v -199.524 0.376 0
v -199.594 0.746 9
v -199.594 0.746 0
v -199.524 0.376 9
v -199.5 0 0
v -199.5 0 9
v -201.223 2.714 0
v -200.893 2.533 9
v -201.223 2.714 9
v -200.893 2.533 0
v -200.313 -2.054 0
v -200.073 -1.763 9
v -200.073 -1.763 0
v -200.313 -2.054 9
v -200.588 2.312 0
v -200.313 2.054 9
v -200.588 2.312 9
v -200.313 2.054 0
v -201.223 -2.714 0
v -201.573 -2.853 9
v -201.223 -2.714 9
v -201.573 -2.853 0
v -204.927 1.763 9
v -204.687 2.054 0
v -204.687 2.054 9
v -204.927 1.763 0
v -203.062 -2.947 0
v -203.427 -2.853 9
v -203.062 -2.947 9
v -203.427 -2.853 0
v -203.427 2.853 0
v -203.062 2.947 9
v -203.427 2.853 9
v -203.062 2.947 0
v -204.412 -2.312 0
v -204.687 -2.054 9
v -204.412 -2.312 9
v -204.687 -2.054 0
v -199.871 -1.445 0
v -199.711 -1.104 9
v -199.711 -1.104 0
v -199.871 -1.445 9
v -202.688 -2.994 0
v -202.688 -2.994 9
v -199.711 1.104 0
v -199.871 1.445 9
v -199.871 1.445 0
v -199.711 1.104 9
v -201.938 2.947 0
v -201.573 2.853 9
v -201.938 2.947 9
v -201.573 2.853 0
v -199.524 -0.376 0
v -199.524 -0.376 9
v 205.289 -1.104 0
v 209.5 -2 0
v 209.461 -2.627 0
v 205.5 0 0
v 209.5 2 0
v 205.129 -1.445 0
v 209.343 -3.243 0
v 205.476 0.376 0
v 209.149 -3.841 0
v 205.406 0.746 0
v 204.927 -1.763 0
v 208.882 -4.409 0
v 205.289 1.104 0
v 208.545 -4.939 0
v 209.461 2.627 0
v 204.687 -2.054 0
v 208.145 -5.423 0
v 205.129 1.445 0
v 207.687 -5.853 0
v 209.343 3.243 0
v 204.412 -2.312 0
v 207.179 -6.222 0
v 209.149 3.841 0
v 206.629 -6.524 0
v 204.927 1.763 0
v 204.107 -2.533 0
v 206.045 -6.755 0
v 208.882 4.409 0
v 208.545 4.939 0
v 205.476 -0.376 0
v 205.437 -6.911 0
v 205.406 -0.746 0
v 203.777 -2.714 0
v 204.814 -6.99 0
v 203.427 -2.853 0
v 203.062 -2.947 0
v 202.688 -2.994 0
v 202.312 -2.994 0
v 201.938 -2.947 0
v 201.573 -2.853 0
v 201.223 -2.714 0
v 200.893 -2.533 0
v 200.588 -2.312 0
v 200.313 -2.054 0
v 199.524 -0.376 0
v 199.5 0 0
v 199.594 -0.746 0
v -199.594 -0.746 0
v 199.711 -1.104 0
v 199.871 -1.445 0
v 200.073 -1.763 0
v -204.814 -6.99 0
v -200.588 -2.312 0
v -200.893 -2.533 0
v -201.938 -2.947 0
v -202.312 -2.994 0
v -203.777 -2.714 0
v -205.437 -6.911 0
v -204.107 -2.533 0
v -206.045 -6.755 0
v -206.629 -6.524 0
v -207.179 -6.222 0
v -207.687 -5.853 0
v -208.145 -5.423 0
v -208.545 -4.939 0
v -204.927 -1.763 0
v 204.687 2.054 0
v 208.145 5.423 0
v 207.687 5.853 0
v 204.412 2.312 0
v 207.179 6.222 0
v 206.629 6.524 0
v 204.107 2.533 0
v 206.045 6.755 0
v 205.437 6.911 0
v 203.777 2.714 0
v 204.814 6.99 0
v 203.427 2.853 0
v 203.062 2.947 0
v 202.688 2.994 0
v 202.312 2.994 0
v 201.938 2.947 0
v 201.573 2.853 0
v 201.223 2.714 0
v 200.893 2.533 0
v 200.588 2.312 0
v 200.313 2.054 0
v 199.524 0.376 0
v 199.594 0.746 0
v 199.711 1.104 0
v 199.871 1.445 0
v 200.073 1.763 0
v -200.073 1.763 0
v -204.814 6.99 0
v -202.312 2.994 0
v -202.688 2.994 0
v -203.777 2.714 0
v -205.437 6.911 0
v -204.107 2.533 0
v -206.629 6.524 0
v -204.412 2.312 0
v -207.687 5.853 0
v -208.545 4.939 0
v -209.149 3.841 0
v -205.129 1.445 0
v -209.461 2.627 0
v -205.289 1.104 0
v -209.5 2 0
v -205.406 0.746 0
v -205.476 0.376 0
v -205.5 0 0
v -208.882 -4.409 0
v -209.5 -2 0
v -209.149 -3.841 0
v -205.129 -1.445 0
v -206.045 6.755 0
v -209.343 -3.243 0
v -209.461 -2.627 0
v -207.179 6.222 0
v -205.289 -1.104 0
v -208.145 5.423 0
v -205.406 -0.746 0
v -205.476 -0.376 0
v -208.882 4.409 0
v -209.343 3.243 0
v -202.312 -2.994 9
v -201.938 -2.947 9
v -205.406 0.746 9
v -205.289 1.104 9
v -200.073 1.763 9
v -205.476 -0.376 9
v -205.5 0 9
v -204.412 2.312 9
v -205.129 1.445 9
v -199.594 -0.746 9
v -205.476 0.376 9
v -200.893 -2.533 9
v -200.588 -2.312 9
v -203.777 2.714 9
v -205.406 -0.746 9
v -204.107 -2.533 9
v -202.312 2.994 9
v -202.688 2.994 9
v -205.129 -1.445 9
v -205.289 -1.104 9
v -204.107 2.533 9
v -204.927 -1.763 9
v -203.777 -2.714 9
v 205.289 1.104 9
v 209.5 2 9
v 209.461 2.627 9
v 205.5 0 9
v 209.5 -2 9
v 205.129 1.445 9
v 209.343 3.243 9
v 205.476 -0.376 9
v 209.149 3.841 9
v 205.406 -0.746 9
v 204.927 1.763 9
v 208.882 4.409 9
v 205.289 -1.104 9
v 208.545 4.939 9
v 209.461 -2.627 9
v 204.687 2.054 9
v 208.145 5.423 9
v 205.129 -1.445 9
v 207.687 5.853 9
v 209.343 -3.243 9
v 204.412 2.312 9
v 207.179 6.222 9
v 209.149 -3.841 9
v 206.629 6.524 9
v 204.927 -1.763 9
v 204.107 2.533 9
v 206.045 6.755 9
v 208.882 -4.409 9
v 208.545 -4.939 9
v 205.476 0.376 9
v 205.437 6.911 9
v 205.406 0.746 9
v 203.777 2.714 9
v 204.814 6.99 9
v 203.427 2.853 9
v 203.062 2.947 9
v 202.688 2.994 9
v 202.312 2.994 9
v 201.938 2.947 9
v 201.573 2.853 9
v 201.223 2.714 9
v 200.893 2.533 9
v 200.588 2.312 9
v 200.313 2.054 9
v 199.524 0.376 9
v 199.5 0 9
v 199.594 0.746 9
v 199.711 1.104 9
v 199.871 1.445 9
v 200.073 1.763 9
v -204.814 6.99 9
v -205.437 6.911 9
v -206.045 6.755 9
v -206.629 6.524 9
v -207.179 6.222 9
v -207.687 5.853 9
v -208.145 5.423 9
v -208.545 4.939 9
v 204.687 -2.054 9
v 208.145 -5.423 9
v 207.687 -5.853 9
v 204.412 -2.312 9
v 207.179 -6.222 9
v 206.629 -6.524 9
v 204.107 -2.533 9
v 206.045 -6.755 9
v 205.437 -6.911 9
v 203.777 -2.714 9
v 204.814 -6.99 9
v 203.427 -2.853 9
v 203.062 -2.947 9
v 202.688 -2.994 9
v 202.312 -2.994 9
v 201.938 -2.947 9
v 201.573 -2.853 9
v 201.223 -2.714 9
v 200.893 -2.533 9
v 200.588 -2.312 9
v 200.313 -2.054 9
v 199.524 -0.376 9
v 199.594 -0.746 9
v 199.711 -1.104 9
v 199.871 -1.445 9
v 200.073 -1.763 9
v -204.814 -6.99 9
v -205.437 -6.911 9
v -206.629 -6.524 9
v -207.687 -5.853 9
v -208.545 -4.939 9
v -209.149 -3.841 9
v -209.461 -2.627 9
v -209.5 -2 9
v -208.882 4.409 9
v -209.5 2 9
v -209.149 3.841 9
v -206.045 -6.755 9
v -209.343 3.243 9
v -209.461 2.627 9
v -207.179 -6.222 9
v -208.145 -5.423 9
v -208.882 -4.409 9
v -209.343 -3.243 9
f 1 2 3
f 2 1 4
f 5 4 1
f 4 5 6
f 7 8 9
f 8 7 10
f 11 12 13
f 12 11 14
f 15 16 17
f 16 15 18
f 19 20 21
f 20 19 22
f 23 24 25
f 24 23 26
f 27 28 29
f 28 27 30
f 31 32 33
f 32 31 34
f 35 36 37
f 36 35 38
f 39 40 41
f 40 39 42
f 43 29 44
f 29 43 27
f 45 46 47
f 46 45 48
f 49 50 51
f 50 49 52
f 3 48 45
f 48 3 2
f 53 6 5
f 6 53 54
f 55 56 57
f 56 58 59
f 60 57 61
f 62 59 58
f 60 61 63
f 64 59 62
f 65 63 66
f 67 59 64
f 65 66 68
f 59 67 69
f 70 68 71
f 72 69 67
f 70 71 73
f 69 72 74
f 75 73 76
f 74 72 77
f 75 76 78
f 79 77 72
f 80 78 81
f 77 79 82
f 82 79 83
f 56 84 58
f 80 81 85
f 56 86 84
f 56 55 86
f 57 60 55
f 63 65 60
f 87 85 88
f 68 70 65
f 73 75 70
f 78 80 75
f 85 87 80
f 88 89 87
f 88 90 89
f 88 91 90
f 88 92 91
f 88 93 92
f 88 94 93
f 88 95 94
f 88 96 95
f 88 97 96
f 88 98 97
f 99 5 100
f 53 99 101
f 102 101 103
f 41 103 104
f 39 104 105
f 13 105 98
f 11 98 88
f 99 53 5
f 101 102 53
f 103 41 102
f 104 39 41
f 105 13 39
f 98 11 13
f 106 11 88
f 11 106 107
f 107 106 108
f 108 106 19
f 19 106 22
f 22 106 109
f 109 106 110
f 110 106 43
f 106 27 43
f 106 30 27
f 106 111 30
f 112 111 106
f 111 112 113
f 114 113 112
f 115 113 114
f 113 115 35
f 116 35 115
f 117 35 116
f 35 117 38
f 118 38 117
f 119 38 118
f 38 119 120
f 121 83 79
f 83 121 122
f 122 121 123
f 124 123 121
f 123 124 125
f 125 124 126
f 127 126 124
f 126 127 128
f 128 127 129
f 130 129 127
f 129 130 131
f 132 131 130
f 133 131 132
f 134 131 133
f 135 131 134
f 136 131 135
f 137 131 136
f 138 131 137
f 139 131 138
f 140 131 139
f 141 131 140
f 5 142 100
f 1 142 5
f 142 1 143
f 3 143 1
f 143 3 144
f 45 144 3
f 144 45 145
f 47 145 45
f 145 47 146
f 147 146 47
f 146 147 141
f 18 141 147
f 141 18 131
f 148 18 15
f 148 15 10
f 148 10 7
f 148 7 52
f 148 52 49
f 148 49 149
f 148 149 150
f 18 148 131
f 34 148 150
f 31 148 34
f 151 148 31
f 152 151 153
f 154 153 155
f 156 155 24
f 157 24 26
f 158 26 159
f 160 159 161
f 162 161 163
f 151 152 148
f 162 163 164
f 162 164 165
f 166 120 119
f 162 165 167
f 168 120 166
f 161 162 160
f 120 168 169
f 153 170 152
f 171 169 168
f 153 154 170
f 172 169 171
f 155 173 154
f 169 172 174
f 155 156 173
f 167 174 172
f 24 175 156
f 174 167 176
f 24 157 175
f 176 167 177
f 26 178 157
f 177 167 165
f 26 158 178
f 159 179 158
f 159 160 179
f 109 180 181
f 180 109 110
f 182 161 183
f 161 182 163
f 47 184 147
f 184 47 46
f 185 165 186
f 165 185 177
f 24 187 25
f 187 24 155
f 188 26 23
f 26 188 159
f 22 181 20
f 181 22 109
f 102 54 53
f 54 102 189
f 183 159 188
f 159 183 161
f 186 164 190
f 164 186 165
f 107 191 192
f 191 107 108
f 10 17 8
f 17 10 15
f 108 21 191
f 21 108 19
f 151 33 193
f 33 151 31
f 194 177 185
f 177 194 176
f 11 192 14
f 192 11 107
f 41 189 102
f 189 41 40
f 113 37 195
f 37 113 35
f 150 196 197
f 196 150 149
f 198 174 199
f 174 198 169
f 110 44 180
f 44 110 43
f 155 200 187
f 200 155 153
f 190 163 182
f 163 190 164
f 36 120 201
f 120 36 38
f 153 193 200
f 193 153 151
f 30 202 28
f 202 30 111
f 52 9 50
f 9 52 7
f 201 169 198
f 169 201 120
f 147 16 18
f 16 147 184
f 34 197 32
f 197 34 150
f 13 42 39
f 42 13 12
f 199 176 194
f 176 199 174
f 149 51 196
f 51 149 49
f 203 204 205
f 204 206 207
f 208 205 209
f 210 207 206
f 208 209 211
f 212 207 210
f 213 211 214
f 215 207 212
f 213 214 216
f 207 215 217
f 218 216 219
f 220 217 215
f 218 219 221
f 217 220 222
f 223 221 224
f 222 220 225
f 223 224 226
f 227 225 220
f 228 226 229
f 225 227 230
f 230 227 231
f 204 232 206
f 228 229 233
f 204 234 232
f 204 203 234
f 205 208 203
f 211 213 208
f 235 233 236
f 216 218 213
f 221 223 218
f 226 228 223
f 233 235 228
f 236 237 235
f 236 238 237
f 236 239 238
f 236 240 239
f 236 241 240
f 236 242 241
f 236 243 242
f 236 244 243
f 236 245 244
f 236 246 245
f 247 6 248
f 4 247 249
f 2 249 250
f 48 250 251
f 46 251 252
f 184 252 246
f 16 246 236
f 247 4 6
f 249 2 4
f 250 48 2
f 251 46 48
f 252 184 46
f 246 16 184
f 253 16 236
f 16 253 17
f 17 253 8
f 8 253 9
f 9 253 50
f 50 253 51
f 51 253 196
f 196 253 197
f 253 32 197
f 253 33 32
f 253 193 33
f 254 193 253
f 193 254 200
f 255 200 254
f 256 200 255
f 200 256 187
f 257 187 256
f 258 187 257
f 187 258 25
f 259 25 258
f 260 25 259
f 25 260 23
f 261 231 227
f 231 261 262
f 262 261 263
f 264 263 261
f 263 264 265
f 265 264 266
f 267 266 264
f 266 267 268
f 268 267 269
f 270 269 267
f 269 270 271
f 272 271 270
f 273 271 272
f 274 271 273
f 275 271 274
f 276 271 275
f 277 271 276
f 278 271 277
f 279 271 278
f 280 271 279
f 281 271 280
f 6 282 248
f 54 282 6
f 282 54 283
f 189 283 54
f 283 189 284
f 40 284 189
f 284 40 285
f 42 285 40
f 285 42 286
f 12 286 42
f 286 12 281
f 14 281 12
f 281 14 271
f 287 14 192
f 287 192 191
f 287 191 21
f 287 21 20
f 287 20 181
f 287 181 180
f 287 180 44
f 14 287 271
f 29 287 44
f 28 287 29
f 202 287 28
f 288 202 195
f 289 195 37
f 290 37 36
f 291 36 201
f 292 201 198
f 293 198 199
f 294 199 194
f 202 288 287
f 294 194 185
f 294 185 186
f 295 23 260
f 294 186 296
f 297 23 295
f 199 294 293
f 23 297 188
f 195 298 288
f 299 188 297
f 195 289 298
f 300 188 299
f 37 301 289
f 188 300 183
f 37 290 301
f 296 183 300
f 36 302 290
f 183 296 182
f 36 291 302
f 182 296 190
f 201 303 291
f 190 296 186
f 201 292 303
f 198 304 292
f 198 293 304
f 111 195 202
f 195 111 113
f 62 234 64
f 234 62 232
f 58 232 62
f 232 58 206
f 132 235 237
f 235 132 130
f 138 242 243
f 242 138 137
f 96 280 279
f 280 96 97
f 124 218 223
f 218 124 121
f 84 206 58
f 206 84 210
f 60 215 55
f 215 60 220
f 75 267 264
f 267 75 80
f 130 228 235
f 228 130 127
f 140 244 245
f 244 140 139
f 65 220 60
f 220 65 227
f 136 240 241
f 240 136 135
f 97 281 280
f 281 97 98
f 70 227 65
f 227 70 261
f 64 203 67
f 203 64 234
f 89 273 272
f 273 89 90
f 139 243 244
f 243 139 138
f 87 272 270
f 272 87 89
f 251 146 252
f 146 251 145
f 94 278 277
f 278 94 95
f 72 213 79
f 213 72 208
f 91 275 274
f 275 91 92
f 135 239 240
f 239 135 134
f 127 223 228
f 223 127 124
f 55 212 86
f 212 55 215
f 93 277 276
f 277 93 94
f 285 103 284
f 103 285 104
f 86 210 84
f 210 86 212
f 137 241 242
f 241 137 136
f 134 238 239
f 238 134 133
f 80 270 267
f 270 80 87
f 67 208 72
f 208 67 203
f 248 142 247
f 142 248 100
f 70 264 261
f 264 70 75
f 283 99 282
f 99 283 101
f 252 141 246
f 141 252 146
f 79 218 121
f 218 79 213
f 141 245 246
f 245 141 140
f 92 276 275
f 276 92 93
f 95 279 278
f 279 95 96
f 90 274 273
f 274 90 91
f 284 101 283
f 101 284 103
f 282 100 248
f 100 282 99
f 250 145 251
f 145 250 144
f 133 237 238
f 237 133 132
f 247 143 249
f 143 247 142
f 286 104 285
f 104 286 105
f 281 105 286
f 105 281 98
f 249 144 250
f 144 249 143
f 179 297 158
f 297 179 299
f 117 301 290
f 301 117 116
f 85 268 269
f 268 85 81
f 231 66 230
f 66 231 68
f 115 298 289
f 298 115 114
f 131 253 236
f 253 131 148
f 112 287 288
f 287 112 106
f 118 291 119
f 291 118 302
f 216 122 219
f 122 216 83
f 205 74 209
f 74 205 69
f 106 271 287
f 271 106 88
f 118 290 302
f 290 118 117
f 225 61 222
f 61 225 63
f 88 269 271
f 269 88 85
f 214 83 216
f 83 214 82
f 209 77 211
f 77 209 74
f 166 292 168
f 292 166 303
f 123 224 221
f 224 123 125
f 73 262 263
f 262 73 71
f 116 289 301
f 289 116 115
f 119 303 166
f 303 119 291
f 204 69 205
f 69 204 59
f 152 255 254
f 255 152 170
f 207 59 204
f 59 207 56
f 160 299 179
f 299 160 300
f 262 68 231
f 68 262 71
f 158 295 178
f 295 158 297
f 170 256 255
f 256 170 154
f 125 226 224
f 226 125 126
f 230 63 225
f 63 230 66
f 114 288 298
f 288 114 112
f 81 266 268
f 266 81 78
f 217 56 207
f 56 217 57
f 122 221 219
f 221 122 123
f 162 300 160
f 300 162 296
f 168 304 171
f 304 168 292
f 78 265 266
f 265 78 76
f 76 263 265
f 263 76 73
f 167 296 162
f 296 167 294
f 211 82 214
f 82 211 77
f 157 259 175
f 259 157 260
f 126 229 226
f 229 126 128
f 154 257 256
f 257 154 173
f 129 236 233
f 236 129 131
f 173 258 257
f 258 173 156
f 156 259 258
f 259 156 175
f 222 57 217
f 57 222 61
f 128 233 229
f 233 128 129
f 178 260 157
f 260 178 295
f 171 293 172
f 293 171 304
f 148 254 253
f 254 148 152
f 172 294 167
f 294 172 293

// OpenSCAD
$fn = 50;


difference() {
	union() {
		hull() {
			translate(v = [-204.5000000000, 2.0000000000, 0]) {
				cylinder(h = 9, r = 5);
			}
			translate(v = [204.5000000000, 2.0000000000, 0]) {
				cylinder(h = 9, r = 5);
			}
			translate(v = [-204.5000000000, -2.0000000000, 0]) {
				cylinder(h = 9, r = 5);
			}
			translate(v = [204.5000000000, -2.0000000000, 0]) {
				cylinder(h = 9, r = 5);
			}
		}
	}
	union() {
		translate(v = [-202.5000000000, 0.0000000000, 0]) {
			cylinder(h = 9, r = 3.0000000000);
		}
		translate(v = [202.5000000000, 0.0000000000, 0]) {
			cylinder(h = 9, r = 3.0000000000);
		}
		translate(v = [-202.5000000000, 0.0000000000, 0]) {
			cylinder(h = 9, r = 1.5000000000);
		}
		translate(v = [202.5000000000, 0.0000000000, 0]) {
			cylinder(h = 9, r = 1.5000000000);
		}
		translate(v = [-202.5000000000, 0.0000000000, 0]) {
			cylinder(h = 9, r = 1.5000000000);
		}
		translate(v = [202.5000000000, 0.0000000000, 0]) {
			cylinder(h = 9, r = 1.5000000000);
		}
		translate(v = [-202.5000000000, 0.0000000000, 0]) {
			cylinder(h = 9, r = 1.5000000000);
		}
		translate(v = [202.5000000000, 0.0000000000, 0]) {
			cylinder(h = 9, r = 1.5000000000);
		}
	}
}
